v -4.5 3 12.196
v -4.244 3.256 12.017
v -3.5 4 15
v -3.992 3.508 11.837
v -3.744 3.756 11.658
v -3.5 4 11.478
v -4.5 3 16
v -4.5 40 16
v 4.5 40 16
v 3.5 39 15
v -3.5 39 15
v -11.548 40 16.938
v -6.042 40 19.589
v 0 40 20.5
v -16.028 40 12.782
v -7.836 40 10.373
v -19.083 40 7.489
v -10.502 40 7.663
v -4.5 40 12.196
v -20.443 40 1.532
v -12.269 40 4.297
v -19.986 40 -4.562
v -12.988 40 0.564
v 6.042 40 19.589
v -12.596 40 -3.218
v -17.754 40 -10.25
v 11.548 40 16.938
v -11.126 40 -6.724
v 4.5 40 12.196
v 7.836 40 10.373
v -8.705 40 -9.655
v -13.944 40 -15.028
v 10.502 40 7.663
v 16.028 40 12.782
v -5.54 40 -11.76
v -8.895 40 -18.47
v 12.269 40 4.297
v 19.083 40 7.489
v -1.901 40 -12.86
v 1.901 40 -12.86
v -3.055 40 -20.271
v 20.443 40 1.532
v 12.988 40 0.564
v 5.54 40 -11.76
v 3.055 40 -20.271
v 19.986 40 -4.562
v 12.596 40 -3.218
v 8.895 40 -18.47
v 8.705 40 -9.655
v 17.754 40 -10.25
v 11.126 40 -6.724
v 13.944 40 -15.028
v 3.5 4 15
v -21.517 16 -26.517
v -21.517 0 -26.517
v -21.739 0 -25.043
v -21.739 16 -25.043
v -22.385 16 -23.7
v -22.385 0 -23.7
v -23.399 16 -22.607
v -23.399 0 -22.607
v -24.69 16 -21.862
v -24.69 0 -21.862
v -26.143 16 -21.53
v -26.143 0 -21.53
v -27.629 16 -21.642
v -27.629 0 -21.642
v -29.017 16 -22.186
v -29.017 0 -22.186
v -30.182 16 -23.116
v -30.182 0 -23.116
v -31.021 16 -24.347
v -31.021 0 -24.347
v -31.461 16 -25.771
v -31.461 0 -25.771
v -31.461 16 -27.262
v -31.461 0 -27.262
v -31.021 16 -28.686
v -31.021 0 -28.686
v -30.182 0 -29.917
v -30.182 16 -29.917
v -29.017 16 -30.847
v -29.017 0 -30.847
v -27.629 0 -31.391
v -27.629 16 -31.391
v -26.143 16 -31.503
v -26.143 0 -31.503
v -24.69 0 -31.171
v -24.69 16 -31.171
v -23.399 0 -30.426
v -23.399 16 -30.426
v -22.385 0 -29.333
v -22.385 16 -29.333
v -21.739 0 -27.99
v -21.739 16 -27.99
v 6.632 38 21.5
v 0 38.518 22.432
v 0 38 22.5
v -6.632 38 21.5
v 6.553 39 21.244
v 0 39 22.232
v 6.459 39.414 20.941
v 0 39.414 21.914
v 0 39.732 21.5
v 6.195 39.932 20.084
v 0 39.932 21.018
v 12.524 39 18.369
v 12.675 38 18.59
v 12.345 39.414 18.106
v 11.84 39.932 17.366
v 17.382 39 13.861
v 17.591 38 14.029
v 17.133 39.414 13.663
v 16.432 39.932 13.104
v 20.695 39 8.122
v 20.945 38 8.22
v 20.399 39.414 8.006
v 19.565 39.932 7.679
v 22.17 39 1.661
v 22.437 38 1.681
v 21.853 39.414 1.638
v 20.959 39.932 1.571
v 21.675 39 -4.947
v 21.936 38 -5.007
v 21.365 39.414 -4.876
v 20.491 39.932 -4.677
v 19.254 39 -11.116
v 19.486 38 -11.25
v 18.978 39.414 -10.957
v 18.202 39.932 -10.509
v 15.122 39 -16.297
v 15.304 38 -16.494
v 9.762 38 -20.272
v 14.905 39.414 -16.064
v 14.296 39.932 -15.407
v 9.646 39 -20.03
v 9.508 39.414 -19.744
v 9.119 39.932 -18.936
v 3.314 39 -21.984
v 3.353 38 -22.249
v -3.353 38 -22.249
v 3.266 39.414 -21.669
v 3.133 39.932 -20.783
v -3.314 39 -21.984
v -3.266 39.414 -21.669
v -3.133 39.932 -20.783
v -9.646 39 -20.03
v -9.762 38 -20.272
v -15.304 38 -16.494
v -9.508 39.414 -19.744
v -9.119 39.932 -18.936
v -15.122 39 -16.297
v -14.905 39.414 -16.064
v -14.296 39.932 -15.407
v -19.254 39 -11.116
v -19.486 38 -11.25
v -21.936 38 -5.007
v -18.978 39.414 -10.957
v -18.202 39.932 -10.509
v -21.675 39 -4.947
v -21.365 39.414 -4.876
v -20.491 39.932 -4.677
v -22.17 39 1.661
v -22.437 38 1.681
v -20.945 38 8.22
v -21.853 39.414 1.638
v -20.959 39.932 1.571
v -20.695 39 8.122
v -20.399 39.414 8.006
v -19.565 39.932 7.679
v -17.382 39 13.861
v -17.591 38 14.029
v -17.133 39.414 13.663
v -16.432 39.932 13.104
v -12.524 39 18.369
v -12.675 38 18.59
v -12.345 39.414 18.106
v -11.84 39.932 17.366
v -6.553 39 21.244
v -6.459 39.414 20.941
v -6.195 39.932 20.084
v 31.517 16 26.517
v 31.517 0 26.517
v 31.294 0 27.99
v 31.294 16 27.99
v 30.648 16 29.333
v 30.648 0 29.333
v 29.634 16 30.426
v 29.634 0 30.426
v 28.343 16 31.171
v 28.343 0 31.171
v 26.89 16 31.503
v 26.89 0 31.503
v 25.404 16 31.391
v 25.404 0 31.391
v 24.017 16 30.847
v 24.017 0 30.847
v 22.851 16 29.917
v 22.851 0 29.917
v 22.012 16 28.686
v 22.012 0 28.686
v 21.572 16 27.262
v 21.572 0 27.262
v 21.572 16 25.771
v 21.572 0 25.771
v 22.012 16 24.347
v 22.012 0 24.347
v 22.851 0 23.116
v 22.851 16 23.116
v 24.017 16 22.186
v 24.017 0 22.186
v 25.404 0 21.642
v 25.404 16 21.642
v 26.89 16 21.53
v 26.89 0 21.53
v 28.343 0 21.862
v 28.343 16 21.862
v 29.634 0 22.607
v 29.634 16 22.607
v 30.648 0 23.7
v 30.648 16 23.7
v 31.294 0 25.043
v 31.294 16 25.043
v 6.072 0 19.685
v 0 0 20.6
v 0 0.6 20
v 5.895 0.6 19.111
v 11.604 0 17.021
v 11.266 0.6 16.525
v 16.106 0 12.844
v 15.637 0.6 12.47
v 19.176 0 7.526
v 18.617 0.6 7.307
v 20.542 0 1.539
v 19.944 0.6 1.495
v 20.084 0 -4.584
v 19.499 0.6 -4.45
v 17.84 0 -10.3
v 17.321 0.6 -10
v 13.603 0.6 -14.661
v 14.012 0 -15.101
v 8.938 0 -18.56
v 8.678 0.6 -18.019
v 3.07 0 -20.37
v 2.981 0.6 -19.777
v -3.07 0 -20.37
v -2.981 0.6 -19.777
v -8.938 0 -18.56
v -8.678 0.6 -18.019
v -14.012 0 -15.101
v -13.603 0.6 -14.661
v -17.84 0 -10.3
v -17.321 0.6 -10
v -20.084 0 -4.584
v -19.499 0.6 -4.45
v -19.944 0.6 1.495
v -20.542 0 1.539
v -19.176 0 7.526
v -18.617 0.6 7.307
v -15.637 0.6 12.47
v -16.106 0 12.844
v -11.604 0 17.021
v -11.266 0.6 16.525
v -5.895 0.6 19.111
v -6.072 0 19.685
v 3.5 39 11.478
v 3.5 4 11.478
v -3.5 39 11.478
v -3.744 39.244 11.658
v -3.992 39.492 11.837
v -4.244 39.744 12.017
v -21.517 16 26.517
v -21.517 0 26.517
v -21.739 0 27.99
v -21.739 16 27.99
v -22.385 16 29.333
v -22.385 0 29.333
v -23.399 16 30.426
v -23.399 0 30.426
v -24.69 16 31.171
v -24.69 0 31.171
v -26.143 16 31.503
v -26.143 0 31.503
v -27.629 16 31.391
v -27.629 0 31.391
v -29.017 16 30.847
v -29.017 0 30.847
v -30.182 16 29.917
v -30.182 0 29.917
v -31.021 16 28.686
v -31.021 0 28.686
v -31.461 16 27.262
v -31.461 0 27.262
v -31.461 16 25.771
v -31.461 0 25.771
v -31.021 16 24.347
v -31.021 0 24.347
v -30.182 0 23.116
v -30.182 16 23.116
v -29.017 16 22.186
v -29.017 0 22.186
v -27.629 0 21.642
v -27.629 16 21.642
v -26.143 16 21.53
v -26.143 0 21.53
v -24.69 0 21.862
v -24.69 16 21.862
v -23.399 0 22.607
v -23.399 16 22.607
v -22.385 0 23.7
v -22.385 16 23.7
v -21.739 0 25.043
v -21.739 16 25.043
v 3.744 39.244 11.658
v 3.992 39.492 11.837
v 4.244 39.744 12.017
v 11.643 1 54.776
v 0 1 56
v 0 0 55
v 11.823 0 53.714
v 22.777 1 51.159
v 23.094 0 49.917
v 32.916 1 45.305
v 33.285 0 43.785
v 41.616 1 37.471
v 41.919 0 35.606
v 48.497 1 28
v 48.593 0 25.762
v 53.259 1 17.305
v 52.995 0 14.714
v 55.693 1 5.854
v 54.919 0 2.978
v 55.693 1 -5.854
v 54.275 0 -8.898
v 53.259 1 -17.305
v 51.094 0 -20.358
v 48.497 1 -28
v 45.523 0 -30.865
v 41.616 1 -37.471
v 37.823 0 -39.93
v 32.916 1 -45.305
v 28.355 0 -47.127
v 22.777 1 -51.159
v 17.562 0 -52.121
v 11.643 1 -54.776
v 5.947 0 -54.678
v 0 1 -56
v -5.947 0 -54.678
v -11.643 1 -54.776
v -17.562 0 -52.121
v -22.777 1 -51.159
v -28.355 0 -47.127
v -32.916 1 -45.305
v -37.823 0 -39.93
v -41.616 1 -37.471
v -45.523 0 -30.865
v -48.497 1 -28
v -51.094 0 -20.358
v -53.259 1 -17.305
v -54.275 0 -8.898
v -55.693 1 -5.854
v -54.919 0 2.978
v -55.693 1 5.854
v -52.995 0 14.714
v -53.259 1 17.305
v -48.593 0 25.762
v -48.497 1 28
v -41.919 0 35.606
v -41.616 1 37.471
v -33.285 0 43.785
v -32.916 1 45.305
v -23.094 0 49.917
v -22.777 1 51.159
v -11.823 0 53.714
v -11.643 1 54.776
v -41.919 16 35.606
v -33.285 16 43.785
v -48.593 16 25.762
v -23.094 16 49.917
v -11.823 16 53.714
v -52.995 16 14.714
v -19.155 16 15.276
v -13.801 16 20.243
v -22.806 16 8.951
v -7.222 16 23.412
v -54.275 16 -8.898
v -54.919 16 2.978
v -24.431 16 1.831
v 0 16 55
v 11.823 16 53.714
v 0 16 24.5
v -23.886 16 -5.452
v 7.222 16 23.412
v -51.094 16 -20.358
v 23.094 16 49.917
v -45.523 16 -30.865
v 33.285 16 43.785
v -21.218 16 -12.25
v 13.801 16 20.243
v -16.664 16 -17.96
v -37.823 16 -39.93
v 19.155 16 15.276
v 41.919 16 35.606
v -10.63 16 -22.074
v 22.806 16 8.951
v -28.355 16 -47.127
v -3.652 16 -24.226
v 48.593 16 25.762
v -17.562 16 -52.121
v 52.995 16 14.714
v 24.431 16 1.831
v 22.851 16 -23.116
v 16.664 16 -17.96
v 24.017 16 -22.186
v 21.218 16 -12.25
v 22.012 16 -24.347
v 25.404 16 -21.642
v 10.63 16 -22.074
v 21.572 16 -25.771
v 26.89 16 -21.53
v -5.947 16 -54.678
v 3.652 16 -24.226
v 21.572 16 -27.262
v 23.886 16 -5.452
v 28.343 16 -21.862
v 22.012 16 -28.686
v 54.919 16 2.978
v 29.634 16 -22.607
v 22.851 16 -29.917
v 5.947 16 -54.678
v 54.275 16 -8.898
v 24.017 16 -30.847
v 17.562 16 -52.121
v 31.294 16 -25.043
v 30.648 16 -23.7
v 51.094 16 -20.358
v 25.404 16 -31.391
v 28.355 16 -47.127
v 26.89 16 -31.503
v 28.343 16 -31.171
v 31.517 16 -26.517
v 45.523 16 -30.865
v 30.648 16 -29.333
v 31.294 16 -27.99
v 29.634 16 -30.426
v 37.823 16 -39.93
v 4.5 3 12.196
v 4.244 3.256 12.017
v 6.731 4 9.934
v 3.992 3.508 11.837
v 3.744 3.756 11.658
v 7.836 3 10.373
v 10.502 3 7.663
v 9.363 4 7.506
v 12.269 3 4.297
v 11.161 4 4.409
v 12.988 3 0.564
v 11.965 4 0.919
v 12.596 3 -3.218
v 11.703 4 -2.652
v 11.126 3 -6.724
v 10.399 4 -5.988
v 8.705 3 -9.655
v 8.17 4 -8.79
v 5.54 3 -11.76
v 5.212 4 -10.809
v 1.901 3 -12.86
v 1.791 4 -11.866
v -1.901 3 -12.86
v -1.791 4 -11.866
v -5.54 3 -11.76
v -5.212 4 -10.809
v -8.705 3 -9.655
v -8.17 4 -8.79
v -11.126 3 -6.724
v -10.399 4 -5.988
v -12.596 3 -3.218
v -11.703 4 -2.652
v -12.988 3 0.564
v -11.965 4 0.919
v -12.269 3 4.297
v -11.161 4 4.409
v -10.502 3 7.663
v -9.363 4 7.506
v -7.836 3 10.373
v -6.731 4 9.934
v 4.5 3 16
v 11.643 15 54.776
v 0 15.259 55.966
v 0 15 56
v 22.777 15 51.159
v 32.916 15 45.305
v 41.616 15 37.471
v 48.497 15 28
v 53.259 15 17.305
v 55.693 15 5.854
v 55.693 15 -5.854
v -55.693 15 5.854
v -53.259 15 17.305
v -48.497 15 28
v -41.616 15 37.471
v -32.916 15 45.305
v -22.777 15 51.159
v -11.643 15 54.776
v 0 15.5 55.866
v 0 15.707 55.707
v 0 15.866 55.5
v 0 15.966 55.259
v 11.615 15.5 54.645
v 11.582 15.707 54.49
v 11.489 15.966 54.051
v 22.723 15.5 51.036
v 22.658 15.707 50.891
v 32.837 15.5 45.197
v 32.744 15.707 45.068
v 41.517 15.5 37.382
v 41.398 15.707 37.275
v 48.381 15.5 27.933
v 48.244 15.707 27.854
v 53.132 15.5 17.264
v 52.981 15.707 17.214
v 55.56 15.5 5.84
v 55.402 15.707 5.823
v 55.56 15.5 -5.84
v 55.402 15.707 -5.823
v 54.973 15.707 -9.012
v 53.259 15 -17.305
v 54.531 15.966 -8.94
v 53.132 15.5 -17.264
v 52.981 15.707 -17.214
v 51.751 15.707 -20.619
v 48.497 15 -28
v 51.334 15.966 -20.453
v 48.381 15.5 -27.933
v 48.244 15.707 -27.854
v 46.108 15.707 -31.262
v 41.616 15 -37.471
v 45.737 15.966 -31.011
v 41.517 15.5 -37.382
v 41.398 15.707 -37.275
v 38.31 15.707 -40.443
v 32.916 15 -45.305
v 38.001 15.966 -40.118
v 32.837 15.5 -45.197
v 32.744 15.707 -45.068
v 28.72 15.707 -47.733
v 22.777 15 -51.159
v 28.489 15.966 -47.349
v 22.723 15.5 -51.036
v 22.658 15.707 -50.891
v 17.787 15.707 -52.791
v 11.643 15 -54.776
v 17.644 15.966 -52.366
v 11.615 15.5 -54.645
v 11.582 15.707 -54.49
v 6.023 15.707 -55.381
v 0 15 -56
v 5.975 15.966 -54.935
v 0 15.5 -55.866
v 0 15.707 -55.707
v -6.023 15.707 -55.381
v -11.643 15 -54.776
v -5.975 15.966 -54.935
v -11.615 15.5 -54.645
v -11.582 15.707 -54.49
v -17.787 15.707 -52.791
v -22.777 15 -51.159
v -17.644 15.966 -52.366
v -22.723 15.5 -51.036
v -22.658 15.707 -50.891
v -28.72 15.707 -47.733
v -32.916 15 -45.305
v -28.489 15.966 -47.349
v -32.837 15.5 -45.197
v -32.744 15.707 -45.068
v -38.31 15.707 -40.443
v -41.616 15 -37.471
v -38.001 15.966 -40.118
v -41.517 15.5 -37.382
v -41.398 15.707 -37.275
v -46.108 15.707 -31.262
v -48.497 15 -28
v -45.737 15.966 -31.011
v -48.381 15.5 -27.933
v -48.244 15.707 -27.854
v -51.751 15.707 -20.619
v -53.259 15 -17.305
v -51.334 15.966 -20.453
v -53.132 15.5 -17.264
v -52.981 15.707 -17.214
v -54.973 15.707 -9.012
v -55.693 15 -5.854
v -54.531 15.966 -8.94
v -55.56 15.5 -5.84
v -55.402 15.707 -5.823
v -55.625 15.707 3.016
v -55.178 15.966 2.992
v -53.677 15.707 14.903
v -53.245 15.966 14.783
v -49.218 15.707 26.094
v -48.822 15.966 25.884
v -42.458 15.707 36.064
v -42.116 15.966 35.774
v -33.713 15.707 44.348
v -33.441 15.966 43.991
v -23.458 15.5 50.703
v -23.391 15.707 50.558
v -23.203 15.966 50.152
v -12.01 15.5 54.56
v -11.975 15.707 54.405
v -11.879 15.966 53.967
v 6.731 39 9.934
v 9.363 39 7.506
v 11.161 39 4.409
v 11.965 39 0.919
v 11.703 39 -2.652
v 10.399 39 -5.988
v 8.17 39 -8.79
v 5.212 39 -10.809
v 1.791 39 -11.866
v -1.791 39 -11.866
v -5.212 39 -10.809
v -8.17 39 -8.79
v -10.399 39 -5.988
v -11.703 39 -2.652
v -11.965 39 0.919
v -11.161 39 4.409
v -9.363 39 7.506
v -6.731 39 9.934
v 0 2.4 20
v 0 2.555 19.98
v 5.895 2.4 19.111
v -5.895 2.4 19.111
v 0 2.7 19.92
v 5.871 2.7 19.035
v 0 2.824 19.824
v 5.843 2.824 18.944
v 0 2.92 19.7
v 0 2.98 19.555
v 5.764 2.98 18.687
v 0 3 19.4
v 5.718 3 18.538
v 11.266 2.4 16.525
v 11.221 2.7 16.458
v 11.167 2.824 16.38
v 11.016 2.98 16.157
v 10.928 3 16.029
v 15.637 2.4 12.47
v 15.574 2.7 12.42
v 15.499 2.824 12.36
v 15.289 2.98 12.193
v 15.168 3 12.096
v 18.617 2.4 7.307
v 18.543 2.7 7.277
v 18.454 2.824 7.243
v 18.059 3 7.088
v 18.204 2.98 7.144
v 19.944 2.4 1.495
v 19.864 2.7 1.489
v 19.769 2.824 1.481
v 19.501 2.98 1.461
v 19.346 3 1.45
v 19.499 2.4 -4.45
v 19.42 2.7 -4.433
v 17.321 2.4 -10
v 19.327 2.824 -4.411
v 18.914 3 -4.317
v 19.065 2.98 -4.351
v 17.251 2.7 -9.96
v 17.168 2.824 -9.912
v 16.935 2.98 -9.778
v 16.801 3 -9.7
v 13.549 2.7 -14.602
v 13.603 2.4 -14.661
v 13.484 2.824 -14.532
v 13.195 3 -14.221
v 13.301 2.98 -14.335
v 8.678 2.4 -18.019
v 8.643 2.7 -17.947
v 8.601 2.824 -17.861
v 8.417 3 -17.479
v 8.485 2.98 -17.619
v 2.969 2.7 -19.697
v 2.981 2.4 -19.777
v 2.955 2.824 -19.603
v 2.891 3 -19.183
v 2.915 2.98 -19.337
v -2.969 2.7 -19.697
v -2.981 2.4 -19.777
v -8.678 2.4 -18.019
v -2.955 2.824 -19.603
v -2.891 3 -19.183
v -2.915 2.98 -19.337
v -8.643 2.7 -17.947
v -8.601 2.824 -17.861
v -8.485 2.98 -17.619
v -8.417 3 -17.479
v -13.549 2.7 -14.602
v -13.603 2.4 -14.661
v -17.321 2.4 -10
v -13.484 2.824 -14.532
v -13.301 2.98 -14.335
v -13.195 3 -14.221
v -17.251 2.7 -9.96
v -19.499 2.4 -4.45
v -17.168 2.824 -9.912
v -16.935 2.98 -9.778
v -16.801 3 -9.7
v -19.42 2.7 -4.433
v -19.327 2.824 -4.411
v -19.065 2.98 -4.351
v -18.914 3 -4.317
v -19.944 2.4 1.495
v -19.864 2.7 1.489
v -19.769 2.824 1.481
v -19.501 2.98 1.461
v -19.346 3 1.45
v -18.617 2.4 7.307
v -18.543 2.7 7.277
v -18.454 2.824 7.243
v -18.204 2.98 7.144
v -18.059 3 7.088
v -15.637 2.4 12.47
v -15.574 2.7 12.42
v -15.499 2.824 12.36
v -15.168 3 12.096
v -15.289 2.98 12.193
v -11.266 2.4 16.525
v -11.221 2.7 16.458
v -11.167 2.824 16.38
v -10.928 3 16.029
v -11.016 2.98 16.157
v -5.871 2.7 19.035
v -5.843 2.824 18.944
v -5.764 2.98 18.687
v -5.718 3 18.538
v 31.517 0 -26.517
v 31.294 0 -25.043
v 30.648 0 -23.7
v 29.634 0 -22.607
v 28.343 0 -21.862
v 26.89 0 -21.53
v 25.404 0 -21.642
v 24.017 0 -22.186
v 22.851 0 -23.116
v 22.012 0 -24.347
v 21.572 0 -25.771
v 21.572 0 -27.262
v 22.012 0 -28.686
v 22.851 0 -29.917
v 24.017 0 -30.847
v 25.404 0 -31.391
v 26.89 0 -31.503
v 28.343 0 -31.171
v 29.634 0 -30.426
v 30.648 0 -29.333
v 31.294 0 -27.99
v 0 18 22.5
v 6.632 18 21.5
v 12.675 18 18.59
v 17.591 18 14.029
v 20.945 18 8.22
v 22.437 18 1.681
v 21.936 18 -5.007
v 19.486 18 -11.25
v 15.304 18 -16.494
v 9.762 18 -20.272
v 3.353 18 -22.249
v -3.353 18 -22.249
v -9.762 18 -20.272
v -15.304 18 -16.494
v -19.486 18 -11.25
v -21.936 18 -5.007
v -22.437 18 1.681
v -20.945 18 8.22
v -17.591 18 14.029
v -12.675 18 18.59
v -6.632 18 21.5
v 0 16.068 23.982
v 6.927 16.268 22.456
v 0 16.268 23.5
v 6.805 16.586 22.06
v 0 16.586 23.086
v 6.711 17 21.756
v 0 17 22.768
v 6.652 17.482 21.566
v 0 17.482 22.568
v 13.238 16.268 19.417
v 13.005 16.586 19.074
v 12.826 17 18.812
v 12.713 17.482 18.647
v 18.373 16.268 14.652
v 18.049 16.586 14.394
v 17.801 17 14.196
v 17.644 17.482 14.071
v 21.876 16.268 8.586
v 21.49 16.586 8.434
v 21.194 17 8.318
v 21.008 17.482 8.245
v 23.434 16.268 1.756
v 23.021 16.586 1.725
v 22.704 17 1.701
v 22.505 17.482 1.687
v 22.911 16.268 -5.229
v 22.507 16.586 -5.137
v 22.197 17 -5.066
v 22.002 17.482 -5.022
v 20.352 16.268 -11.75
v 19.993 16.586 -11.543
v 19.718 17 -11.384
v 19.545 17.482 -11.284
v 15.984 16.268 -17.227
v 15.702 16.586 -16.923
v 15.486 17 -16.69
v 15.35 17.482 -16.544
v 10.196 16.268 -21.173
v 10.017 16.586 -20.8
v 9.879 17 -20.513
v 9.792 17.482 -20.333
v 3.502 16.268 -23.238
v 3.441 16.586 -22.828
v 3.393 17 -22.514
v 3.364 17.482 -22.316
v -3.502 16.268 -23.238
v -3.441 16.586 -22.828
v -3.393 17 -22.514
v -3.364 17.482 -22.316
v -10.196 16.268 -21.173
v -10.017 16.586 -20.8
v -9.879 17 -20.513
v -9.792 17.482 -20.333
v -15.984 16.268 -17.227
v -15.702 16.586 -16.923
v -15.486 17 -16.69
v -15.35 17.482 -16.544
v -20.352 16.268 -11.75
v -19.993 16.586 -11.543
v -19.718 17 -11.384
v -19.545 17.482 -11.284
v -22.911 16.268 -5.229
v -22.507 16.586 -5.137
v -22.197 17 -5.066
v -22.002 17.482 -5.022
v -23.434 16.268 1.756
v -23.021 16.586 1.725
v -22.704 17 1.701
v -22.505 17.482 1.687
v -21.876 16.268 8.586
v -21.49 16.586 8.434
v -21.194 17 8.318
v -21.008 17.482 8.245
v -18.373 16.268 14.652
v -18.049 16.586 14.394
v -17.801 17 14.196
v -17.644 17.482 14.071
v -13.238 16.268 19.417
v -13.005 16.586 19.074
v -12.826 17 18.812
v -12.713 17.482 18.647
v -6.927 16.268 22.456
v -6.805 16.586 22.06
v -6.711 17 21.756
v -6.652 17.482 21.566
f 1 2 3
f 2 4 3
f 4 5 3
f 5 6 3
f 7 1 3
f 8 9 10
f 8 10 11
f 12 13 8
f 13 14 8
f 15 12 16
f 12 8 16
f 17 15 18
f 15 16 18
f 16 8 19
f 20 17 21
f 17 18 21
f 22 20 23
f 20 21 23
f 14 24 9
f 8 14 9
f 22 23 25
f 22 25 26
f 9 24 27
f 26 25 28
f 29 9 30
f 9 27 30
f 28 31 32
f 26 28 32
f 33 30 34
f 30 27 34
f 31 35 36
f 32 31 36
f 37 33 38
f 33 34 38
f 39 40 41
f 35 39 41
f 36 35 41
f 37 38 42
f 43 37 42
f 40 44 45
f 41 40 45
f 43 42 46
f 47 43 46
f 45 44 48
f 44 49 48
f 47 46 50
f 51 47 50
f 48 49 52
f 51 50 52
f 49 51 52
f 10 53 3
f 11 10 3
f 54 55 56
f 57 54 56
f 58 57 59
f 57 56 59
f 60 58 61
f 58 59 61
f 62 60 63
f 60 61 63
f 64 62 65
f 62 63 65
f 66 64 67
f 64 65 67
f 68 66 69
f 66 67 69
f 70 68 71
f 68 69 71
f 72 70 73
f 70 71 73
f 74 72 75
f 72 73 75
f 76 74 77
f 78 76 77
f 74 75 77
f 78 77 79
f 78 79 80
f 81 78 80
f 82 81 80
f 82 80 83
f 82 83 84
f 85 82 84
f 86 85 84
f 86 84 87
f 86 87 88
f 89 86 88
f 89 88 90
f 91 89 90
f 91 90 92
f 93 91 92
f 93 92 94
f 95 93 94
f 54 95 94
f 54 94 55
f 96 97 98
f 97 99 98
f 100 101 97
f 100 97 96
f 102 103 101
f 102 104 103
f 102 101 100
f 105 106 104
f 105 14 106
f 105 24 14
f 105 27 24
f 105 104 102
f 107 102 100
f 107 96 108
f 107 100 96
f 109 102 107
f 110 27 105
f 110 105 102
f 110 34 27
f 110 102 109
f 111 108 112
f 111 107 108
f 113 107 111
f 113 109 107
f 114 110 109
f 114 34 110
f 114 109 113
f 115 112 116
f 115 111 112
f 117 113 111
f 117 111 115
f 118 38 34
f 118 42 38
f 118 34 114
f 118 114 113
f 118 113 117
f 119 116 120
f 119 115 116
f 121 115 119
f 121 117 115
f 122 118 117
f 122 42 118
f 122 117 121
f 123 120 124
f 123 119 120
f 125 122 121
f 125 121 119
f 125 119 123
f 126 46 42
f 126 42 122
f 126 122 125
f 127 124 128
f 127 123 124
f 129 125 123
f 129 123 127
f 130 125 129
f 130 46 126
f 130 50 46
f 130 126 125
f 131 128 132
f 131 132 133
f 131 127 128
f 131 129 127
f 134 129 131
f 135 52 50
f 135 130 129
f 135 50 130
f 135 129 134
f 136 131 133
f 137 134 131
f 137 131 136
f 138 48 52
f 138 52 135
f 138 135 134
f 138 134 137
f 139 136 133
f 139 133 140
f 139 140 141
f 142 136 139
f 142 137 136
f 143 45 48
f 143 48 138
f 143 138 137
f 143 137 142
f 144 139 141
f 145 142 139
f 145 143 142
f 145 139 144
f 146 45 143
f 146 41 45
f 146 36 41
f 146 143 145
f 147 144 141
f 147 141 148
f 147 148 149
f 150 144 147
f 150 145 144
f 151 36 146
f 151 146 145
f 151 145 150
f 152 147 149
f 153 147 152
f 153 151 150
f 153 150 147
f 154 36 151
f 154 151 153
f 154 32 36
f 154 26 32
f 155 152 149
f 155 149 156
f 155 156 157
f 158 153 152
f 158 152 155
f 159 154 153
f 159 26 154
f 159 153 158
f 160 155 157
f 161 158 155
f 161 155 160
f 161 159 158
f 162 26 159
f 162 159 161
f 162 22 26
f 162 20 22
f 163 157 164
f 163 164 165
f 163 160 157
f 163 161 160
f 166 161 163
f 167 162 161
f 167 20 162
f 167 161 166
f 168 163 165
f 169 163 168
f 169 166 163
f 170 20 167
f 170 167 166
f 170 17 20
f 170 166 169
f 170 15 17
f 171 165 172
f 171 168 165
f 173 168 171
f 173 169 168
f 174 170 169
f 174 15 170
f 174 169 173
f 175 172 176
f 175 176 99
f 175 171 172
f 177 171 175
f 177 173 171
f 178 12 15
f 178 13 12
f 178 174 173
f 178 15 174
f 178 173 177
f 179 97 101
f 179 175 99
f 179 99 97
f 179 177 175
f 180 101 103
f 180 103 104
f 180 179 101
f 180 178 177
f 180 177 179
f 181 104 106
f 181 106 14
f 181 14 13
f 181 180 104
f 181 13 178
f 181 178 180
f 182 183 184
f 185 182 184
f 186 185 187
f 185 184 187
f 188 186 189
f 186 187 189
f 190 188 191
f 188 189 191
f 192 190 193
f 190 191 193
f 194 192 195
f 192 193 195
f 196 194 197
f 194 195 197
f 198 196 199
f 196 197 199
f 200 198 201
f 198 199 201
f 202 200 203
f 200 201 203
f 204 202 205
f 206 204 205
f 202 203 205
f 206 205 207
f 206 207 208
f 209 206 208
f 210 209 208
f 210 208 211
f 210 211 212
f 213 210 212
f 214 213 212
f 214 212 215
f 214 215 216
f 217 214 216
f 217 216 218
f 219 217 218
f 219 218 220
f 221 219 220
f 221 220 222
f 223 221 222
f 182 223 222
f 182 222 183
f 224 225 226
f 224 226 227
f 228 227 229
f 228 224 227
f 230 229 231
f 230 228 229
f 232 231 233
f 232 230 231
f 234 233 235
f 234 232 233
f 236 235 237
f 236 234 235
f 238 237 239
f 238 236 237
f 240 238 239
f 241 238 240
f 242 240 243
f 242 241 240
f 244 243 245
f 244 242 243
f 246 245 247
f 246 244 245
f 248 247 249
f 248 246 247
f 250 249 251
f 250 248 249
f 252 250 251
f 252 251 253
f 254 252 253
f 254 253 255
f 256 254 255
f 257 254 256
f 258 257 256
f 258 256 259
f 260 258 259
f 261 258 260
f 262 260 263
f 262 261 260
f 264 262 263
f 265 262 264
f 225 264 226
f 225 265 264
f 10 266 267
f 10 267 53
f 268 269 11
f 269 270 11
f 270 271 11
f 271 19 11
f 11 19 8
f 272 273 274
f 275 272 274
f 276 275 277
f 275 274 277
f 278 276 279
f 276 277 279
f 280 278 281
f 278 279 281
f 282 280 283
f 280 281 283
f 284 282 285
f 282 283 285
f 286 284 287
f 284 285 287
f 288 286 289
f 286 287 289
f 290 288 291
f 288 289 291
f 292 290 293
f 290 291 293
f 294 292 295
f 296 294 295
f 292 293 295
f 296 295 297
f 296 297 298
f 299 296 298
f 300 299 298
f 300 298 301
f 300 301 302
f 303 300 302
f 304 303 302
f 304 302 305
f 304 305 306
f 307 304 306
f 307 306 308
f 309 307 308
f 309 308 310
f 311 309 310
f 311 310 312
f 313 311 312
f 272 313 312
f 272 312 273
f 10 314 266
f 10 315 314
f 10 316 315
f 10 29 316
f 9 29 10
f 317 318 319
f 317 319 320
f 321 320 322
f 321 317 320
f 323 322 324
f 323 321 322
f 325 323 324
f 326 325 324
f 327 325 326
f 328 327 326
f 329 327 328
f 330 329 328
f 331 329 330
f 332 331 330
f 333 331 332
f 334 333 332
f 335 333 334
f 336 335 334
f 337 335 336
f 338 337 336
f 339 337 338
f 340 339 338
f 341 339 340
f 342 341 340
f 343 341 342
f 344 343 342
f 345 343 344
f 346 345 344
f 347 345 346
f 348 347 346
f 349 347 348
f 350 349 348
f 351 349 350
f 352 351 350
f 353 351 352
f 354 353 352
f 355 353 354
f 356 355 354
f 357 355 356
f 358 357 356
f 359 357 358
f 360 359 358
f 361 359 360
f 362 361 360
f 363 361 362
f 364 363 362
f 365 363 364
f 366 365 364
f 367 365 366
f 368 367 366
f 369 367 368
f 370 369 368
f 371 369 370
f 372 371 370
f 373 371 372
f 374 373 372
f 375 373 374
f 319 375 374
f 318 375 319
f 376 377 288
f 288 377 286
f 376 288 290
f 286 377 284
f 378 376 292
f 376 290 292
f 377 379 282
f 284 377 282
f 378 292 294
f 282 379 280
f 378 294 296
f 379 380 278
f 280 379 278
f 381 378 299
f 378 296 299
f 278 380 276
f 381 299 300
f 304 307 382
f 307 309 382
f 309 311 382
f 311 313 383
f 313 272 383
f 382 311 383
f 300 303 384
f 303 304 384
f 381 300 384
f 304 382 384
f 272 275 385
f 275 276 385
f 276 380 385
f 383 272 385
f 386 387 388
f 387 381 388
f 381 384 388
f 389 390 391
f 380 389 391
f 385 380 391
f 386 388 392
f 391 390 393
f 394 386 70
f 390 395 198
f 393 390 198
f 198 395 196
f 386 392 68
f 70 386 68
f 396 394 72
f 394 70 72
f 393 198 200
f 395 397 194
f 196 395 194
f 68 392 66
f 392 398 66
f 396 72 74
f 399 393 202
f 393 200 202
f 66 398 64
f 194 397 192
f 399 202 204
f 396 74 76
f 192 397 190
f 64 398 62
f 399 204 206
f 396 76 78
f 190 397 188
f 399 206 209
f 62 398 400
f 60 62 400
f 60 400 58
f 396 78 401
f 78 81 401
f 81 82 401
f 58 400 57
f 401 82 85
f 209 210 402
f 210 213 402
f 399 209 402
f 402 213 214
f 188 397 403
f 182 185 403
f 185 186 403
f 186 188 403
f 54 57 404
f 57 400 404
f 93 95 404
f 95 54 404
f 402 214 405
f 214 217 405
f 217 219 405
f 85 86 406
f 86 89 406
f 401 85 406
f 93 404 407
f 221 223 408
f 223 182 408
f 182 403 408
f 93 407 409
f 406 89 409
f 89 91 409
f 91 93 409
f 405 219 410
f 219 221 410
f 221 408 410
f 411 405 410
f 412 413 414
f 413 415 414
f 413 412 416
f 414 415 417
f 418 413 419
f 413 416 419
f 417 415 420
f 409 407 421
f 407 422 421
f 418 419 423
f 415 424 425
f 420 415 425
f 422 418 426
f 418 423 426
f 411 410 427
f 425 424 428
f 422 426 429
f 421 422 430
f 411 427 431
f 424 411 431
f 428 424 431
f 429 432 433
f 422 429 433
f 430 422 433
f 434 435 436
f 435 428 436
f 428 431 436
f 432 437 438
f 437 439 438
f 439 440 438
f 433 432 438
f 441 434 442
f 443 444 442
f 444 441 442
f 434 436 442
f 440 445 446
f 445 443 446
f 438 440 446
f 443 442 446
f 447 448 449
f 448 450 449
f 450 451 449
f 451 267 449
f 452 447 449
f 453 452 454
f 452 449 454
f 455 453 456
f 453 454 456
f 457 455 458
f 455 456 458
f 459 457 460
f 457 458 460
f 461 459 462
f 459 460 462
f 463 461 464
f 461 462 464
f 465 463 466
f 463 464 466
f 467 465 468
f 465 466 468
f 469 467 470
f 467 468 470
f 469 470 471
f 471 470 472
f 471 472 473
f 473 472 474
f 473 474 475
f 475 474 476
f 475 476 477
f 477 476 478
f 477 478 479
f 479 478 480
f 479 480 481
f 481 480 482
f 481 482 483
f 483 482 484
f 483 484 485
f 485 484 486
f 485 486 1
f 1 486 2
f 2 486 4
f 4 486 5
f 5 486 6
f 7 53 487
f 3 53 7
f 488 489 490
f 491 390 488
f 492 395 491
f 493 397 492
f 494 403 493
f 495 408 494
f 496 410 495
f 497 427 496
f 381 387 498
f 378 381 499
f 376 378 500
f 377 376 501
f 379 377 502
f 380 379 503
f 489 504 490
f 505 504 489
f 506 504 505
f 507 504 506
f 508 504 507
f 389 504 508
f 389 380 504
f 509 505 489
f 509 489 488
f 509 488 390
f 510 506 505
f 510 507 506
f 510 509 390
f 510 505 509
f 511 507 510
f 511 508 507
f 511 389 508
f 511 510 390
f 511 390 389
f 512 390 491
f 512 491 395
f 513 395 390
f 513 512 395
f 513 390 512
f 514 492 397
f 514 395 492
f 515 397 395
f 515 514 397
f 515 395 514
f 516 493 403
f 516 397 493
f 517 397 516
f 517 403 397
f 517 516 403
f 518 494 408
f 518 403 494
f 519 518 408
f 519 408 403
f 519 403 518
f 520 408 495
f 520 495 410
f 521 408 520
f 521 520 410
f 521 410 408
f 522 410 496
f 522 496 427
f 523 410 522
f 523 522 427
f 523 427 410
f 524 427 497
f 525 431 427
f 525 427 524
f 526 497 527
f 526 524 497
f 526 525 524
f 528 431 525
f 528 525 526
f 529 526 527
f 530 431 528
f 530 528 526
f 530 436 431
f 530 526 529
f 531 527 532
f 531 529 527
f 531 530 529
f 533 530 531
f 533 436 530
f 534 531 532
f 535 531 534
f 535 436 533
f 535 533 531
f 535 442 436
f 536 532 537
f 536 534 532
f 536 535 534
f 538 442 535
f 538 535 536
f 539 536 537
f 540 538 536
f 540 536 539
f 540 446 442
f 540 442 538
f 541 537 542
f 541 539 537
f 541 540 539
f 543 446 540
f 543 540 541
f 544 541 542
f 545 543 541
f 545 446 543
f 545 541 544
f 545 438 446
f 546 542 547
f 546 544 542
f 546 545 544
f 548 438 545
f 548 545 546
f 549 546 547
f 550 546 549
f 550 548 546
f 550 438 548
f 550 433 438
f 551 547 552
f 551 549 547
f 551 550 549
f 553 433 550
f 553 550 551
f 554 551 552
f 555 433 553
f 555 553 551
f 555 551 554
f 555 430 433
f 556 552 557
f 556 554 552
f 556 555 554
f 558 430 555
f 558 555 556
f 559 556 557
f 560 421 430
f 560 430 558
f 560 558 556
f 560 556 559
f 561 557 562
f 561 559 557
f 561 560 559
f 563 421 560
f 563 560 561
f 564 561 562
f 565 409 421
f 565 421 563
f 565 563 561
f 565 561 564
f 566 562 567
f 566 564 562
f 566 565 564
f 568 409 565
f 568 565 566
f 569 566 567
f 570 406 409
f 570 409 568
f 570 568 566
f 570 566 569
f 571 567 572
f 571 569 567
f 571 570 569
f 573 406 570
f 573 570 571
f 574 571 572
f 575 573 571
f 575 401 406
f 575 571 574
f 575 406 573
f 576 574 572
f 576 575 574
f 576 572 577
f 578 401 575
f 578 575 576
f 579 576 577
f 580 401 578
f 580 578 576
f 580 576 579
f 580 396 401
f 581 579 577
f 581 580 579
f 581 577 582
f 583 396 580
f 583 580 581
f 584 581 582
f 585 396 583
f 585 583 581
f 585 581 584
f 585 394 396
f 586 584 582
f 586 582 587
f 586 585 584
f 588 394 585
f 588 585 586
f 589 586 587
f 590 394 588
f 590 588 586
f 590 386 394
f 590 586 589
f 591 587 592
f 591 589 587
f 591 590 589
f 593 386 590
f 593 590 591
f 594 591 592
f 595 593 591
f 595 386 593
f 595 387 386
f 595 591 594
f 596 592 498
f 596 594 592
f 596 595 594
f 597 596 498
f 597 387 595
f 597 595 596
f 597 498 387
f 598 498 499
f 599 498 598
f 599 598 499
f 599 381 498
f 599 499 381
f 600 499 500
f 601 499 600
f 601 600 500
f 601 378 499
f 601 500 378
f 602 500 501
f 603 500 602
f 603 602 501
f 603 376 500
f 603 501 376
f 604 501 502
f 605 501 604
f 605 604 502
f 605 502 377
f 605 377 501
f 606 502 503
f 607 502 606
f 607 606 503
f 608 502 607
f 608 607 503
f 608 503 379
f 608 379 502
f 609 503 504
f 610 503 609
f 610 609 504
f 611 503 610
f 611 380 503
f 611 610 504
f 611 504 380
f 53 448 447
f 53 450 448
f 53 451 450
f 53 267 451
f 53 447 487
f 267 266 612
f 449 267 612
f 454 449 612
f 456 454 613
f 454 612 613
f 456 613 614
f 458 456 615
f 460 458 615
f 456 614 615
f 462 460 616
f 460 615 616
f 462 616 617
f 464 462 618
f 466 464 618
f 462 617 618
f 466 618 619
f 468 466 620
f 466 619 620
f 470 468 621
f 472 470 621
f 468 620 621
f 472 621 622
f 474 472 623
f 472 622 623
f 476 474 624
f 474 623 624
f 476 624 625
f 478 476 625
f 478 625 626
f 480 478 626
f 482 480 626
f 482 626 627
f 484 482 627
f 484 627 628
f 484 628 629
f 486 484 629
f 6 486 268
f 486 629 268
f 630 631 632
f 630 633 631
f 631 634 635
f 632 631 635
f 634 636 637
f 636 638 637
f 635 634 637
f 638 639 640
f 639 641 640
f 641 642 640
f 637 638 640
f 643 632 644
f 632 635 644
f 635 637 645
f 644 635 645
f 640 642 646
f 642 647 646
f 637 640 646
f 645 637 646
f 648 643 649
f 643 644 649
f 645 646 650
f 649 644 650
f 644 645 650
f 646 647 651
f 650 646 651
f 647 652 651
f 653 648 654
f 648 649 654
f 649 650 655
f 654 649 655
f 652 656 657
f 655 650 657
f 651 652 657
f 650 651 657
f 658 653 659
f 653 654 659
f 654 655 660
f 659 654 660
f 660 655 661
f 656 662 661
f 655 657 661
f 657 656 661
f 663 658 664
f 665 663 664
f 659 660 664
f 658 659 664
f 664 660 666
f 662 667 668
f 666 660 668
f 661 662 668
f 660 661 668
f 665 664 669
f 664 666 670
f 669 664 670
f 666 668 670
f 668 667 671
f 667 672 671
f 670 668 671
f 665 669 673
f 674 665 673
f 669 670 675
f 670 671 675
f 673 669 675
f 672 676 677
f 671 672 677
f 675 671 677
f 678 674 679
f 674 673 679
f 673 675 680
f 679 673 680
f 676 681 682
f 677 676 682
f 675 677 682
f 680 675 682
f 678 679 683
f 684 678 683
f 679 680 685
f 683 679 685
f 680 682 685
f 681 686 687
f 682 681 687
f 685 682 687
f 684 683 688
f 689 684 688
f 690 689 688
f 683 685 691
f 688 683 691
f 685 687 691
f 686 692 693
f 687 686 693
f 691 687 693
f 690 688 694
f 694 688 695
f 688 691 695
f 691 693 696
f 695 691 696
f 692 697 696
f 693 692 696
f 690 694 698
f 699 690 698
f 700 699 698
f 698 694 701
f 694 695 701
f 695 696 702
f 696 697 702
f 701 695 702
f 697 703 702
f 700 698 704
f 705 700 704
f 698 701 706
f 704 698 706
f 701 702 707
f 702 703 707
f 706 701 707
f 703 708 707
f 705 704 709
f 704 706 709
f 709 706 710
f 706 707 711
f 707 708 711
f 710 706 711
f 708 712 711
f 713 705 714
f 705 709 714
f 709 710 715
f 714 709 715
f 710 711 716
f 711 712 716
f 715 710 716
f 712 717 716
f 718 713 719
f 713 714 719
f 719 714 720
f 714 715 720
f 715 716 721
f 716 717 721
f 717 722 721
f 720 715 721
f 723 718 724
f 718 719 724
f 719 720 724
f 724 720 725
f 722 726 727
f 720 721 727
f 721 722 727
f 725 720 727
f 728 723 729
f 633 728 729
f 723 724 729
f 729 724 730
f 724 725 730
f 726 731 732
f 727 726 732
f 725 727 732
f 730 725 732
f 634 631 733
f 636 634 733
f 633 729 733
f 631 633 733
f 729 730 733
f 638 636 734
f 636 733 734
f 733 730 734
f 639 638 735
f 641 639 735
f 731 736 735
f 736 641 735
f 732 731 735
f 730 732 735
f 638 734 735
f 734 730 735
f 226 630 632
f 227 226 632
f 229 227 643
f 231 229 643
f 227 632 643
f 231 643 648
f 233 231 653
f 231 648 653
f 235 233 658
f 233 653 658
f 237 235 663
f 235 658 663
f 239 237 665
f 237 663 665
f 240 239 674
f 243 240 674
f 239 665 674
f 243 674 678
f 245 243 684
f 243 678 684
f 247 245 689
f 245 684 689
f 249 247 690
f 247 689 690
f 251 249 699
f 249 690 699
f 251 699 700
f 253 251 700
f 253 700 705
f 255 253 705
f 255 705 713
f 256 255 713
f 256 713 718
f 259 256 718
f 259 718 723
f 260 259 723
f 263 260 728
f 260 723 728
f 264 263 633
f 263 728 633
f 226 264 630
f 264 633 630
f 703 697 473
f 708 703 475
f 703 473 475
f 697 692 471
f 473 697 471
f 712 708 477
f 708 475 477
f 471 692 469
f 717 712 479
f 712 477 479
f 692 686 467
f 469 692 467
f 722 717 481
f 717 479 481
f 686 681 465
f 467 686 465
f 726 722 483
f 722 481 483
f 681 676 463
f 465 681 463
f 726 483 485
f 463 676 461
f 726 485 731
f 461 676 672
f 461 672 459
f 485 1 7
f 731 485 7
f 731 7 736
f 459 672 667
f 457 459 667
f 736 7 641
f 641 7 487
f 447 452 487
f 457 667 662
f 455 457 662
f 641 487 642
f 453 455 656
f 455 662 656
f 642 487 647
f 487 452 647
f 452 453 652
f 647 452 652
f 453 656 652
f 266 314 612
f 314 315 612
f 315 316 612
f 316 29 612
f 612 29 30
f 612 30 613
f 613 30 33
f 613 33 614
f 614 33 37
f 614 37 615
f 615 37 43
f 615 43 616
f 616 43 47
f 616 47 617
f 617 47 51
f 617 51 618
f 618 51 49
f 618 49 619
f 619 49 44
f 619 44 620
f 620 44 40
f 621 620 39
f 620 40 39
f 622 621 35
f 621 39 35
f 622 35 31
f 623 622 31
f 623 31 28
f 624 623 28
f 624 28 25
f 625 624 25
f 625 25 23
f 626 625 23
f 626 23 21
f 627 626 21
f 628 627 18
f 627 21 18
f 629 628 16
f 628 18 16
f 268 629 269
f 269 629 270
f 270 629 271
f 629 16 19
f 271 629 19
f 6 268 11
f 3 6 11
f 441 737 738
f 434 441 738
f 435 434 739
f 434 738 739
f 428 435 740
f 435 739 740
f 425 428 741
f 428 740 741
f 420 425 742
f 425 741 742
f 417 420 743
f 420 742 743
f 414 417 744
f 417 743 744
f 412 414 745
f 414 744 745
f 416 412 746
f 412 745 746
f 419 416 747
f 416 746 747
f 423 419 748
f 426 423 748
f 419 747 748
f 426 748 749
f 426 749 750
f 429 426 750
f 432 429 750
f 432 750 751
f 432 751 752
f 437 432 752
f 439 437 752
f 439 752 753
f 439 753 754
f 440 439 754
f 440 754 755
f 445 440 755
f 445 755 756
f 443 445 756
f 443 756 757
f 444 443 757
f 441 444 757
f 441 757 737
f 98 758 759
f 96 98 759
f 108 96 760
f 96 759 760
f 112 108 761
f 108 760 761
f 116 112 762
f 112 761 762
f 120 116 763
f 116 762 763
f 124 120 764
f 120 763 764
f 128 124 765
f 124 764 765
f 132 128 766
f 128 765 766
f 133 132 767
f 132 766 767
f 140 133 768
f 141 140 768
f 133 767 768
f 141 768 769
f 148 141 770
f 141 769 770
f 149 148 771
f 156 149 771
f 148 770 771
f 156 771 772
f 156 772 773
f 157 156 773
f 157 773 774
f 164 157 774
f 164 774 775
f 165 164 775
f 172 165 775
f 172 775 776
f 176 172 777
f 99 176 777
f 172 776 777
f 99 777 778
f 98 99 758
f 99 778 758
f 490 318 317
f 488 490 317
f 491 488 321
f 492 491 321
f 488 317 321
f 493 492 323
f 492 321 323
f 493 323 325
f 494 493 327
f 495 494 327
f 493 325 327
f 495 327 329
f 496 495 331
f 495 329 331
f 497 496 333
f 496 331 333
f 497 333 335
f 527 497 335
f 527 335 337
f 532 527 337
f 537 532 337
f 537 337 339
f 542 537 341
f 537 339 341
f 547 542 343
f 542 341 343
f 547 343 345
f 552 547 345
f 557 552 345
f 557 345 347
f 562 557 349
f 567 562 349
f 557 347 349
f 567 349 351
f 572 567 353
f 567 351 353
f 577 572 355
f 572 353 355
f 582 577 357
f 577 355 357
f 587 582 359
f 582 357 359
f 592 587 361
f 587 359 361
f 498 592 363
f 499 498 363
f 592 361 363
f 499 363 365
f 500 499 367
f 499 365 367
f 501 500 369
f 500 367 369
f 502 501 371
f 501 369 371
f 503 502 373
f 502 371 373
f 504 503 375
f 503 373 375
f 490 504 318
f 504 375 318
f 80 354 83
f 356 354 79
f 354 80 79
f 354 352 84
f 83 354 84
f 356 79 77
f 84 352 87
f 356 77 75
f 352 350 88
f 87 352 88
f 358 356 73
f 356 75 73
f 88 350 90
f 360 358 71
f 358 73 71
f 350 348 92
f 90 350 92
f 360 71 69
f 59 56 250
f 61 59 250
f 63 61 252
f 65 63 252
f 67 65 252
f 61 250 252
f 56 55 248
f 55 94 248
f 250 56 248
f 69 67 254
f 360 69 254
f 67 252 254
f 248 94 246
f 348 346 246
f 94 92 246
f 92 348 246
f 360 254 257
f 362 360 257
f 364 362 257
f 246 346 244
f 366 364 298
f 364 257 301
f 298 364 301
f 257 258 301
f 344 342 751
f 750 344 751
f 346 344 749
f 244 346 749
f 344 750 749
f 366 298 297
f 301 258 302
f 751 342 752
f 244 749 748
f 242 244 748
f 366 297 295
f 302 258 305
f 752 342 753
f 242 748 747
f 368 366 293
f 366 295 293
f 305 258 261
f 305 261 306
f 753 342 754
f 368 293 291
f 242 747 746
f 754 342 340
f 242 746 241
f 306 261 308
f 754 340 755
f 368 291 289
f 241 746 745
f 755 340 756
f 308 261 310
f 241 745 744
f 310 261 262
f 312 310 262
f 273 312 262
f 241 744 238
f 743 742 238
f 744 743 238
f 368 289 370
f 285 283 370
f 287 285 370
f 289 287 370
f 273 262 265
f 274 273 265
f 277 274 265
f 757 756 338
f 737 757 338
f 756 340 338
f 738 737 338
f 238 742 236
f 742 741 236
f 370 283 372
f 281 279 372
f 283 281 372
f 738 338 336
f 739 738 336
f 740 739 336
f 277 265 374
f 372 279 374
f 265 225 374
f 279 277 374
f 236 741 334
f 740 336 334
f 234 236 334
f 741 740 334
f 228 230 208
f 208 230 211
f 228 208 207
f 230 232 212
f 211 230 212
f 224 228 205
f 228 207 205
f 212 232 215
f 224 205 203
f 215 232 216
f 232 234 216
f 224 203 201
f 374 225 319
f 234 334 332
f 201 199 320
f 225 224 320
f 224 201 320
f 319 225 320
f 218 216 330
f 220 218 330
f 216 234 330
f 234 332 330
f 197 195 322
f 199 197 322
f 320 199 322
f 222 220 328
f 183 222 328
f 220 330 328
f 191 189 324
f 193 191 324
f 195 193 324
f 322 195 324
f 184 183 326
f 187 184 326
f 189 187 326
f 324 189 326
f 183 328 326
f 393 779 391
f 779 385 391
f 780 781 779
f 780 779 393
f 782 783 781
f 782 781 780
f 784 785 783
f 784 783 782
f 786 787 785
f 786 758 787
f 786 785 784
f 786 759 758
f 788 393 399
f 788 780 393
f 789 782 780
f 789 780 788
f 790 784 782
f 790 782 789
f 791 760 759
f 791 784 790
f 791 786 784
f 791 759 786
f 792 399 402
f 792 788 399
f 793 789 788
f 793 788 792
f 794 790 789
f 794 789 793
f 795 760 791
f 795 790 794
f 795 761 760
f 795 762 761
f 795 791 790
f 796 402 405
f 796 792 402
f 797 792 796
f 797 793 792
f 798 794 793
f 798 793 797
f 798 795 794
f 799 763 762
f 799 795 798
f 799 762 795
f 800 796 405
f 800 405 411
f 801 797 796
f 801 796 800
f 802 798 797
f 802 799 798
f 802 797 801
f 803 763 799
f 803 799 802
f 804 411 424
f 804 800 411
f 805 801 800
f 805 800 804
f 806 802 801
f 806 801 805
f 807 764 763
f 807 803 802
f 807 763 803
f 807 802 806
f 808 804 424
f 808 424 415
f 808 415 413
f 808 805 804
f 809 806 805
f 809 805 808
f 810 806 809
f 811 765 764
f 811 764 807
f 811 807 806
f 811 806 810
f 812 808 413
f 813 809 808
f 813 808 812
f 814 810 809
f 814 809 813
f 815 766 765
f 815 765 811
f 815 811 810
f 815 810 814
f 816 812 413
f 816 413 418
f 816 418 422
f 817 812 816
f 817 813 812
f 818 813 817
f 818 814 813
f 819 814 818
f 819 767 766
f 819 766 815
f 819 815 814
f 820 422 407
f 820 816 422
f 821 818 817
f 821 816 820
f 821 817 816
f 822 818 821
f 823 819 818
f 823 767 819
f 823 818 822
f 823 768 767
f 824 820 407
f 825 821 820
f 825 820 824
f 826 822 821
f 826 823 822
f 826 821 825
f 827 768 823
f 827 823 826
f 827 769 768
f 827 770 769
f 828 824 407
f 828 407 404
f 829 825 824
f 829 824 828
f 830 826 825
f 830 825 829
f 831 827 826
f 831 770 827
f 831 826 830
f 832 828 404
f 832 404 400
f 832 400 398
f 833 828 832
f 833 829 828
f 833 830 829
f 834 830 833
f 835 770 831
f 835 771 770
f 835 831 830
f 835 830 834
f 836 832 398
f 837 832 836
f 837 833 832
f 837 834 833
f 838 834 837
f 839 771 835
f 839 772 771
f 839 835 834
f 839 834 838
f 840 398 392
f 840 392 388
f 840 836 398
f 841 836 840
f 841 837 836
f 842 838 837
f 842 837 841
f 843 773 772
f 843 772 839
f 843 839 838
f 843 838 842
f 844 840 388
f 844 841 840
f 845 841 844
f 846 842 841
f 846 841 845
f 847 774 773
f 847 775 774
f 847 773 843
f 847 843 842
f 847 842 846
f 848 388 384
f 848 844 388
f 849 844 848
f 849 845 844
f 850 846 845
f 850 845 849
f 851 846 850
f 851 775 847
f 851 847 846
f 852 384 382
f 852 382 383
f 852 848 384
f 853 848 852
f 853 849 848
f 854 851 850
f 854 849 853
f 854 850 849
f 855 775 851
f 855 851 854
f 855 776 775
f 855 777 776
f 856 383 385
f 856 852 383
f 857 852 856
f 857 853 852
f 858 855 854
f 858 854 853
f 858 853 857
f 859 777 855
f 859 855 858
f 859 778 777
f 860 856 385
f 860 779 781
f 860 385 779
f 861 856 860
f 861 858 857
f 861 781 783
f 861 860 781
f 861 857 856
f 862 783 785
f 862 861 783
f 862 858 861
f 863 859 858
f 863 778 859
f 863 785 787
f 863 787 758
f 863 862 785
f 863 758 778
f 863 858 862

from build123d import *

# Parameters (mm, degrees)
F2_W     = 7
F2_H     = 7
F3_DEPTH = 40.001
F5_D     = 10
F6_SIZE  = 1
F7_SIZE  = 0.6
F8_R     = 0.6
F9_SIZE  = 1
F10_R    = 1
F11_R    = 2


with BuildPart() as f1:
    # F0 (on Right) → F1 (revolve)
    with BuildSketch(Plane.YZ):
        Polygon((0, 56), (0, 20), (3, 20), (3, 12), (40, 12), (40, 22.5), (16, 22.5), (16, 56), align=None)
    revolve(axis=Axis((0, 11.147524, 0), (0, 1, 0)))

    # F2 (on face) → F3 (cut, through all)
    with BuildSketch(Plane(origin=(0, 40, 0), x_dir=(-1, 0, 0), z_dir=(0, 1, 0))):
        with Locations((0, 11.5)):
            Rectangle(F2_W, F2_H)
    extrude(amount=-F3_DEPTH, mode=Mode.SUBTRACT)

    # F5 (through all)
    with Locations(Plane(origin=(0, 16, 0), x_dir=(-1, 0, 0), z_dir=(0, 1, 0))):
        with Locations((26.516504, 26.516504), (-26.516504, 26.516504), (-26.516504, -26.516504), (26.516504, -26.516504)):
            Hole(F5_D / 2)

    # F6
    f6_edges = [f1.edges().sort_by_distance(p)[0] for p in [
        (0, 3, -12),
        (-3.5, 40, 13.23912),
        (0, 40, 15),
        (3.5, 40, 13.23912),
        (-3.5, 3, 13.23912),
        (0, 40, -12),
        (3.5, 3, 13.23912),
        (0, 3, 15),
    ]]
    chamfer(f6_edges, length=F6_SIZE)

    # F7
    f7_edges = [f1.edges().sort_by_distance(p)[0] for p in [
        (0, 0, -20),
    ]]
    chamfer(f7_edges, length=F7_SIZE)

    # F8
    f8_edges = [f1.edges().sort_by_distance(p)[0] for p in [
        (0, 3, -20),
    ]]
    fillet(f8_edges, radius=F8_R)

    # F9
    f9_edges = [f1.edges().sort_by_distance(p)[0] for p in [
        (0, 0, -56),
    ]]
    chamfer(f9_edges, length=F9_SIZE)

    # F10
    f10_edges = [f1.edges().sort_by_distance(p)[0] for p in [
        (0, 16, -56),
    ]]
    fillet(f10_edges, radius=F10_R)

    # F11
    f11_edges = [f1.edges().sort_by_distance(p)[0] for p in [
        (0, 40, -22.5),
        (0, 16, -22.5),
    ]]
    fillet(f11_edges, radius=F11_R)


solid = f1.part
